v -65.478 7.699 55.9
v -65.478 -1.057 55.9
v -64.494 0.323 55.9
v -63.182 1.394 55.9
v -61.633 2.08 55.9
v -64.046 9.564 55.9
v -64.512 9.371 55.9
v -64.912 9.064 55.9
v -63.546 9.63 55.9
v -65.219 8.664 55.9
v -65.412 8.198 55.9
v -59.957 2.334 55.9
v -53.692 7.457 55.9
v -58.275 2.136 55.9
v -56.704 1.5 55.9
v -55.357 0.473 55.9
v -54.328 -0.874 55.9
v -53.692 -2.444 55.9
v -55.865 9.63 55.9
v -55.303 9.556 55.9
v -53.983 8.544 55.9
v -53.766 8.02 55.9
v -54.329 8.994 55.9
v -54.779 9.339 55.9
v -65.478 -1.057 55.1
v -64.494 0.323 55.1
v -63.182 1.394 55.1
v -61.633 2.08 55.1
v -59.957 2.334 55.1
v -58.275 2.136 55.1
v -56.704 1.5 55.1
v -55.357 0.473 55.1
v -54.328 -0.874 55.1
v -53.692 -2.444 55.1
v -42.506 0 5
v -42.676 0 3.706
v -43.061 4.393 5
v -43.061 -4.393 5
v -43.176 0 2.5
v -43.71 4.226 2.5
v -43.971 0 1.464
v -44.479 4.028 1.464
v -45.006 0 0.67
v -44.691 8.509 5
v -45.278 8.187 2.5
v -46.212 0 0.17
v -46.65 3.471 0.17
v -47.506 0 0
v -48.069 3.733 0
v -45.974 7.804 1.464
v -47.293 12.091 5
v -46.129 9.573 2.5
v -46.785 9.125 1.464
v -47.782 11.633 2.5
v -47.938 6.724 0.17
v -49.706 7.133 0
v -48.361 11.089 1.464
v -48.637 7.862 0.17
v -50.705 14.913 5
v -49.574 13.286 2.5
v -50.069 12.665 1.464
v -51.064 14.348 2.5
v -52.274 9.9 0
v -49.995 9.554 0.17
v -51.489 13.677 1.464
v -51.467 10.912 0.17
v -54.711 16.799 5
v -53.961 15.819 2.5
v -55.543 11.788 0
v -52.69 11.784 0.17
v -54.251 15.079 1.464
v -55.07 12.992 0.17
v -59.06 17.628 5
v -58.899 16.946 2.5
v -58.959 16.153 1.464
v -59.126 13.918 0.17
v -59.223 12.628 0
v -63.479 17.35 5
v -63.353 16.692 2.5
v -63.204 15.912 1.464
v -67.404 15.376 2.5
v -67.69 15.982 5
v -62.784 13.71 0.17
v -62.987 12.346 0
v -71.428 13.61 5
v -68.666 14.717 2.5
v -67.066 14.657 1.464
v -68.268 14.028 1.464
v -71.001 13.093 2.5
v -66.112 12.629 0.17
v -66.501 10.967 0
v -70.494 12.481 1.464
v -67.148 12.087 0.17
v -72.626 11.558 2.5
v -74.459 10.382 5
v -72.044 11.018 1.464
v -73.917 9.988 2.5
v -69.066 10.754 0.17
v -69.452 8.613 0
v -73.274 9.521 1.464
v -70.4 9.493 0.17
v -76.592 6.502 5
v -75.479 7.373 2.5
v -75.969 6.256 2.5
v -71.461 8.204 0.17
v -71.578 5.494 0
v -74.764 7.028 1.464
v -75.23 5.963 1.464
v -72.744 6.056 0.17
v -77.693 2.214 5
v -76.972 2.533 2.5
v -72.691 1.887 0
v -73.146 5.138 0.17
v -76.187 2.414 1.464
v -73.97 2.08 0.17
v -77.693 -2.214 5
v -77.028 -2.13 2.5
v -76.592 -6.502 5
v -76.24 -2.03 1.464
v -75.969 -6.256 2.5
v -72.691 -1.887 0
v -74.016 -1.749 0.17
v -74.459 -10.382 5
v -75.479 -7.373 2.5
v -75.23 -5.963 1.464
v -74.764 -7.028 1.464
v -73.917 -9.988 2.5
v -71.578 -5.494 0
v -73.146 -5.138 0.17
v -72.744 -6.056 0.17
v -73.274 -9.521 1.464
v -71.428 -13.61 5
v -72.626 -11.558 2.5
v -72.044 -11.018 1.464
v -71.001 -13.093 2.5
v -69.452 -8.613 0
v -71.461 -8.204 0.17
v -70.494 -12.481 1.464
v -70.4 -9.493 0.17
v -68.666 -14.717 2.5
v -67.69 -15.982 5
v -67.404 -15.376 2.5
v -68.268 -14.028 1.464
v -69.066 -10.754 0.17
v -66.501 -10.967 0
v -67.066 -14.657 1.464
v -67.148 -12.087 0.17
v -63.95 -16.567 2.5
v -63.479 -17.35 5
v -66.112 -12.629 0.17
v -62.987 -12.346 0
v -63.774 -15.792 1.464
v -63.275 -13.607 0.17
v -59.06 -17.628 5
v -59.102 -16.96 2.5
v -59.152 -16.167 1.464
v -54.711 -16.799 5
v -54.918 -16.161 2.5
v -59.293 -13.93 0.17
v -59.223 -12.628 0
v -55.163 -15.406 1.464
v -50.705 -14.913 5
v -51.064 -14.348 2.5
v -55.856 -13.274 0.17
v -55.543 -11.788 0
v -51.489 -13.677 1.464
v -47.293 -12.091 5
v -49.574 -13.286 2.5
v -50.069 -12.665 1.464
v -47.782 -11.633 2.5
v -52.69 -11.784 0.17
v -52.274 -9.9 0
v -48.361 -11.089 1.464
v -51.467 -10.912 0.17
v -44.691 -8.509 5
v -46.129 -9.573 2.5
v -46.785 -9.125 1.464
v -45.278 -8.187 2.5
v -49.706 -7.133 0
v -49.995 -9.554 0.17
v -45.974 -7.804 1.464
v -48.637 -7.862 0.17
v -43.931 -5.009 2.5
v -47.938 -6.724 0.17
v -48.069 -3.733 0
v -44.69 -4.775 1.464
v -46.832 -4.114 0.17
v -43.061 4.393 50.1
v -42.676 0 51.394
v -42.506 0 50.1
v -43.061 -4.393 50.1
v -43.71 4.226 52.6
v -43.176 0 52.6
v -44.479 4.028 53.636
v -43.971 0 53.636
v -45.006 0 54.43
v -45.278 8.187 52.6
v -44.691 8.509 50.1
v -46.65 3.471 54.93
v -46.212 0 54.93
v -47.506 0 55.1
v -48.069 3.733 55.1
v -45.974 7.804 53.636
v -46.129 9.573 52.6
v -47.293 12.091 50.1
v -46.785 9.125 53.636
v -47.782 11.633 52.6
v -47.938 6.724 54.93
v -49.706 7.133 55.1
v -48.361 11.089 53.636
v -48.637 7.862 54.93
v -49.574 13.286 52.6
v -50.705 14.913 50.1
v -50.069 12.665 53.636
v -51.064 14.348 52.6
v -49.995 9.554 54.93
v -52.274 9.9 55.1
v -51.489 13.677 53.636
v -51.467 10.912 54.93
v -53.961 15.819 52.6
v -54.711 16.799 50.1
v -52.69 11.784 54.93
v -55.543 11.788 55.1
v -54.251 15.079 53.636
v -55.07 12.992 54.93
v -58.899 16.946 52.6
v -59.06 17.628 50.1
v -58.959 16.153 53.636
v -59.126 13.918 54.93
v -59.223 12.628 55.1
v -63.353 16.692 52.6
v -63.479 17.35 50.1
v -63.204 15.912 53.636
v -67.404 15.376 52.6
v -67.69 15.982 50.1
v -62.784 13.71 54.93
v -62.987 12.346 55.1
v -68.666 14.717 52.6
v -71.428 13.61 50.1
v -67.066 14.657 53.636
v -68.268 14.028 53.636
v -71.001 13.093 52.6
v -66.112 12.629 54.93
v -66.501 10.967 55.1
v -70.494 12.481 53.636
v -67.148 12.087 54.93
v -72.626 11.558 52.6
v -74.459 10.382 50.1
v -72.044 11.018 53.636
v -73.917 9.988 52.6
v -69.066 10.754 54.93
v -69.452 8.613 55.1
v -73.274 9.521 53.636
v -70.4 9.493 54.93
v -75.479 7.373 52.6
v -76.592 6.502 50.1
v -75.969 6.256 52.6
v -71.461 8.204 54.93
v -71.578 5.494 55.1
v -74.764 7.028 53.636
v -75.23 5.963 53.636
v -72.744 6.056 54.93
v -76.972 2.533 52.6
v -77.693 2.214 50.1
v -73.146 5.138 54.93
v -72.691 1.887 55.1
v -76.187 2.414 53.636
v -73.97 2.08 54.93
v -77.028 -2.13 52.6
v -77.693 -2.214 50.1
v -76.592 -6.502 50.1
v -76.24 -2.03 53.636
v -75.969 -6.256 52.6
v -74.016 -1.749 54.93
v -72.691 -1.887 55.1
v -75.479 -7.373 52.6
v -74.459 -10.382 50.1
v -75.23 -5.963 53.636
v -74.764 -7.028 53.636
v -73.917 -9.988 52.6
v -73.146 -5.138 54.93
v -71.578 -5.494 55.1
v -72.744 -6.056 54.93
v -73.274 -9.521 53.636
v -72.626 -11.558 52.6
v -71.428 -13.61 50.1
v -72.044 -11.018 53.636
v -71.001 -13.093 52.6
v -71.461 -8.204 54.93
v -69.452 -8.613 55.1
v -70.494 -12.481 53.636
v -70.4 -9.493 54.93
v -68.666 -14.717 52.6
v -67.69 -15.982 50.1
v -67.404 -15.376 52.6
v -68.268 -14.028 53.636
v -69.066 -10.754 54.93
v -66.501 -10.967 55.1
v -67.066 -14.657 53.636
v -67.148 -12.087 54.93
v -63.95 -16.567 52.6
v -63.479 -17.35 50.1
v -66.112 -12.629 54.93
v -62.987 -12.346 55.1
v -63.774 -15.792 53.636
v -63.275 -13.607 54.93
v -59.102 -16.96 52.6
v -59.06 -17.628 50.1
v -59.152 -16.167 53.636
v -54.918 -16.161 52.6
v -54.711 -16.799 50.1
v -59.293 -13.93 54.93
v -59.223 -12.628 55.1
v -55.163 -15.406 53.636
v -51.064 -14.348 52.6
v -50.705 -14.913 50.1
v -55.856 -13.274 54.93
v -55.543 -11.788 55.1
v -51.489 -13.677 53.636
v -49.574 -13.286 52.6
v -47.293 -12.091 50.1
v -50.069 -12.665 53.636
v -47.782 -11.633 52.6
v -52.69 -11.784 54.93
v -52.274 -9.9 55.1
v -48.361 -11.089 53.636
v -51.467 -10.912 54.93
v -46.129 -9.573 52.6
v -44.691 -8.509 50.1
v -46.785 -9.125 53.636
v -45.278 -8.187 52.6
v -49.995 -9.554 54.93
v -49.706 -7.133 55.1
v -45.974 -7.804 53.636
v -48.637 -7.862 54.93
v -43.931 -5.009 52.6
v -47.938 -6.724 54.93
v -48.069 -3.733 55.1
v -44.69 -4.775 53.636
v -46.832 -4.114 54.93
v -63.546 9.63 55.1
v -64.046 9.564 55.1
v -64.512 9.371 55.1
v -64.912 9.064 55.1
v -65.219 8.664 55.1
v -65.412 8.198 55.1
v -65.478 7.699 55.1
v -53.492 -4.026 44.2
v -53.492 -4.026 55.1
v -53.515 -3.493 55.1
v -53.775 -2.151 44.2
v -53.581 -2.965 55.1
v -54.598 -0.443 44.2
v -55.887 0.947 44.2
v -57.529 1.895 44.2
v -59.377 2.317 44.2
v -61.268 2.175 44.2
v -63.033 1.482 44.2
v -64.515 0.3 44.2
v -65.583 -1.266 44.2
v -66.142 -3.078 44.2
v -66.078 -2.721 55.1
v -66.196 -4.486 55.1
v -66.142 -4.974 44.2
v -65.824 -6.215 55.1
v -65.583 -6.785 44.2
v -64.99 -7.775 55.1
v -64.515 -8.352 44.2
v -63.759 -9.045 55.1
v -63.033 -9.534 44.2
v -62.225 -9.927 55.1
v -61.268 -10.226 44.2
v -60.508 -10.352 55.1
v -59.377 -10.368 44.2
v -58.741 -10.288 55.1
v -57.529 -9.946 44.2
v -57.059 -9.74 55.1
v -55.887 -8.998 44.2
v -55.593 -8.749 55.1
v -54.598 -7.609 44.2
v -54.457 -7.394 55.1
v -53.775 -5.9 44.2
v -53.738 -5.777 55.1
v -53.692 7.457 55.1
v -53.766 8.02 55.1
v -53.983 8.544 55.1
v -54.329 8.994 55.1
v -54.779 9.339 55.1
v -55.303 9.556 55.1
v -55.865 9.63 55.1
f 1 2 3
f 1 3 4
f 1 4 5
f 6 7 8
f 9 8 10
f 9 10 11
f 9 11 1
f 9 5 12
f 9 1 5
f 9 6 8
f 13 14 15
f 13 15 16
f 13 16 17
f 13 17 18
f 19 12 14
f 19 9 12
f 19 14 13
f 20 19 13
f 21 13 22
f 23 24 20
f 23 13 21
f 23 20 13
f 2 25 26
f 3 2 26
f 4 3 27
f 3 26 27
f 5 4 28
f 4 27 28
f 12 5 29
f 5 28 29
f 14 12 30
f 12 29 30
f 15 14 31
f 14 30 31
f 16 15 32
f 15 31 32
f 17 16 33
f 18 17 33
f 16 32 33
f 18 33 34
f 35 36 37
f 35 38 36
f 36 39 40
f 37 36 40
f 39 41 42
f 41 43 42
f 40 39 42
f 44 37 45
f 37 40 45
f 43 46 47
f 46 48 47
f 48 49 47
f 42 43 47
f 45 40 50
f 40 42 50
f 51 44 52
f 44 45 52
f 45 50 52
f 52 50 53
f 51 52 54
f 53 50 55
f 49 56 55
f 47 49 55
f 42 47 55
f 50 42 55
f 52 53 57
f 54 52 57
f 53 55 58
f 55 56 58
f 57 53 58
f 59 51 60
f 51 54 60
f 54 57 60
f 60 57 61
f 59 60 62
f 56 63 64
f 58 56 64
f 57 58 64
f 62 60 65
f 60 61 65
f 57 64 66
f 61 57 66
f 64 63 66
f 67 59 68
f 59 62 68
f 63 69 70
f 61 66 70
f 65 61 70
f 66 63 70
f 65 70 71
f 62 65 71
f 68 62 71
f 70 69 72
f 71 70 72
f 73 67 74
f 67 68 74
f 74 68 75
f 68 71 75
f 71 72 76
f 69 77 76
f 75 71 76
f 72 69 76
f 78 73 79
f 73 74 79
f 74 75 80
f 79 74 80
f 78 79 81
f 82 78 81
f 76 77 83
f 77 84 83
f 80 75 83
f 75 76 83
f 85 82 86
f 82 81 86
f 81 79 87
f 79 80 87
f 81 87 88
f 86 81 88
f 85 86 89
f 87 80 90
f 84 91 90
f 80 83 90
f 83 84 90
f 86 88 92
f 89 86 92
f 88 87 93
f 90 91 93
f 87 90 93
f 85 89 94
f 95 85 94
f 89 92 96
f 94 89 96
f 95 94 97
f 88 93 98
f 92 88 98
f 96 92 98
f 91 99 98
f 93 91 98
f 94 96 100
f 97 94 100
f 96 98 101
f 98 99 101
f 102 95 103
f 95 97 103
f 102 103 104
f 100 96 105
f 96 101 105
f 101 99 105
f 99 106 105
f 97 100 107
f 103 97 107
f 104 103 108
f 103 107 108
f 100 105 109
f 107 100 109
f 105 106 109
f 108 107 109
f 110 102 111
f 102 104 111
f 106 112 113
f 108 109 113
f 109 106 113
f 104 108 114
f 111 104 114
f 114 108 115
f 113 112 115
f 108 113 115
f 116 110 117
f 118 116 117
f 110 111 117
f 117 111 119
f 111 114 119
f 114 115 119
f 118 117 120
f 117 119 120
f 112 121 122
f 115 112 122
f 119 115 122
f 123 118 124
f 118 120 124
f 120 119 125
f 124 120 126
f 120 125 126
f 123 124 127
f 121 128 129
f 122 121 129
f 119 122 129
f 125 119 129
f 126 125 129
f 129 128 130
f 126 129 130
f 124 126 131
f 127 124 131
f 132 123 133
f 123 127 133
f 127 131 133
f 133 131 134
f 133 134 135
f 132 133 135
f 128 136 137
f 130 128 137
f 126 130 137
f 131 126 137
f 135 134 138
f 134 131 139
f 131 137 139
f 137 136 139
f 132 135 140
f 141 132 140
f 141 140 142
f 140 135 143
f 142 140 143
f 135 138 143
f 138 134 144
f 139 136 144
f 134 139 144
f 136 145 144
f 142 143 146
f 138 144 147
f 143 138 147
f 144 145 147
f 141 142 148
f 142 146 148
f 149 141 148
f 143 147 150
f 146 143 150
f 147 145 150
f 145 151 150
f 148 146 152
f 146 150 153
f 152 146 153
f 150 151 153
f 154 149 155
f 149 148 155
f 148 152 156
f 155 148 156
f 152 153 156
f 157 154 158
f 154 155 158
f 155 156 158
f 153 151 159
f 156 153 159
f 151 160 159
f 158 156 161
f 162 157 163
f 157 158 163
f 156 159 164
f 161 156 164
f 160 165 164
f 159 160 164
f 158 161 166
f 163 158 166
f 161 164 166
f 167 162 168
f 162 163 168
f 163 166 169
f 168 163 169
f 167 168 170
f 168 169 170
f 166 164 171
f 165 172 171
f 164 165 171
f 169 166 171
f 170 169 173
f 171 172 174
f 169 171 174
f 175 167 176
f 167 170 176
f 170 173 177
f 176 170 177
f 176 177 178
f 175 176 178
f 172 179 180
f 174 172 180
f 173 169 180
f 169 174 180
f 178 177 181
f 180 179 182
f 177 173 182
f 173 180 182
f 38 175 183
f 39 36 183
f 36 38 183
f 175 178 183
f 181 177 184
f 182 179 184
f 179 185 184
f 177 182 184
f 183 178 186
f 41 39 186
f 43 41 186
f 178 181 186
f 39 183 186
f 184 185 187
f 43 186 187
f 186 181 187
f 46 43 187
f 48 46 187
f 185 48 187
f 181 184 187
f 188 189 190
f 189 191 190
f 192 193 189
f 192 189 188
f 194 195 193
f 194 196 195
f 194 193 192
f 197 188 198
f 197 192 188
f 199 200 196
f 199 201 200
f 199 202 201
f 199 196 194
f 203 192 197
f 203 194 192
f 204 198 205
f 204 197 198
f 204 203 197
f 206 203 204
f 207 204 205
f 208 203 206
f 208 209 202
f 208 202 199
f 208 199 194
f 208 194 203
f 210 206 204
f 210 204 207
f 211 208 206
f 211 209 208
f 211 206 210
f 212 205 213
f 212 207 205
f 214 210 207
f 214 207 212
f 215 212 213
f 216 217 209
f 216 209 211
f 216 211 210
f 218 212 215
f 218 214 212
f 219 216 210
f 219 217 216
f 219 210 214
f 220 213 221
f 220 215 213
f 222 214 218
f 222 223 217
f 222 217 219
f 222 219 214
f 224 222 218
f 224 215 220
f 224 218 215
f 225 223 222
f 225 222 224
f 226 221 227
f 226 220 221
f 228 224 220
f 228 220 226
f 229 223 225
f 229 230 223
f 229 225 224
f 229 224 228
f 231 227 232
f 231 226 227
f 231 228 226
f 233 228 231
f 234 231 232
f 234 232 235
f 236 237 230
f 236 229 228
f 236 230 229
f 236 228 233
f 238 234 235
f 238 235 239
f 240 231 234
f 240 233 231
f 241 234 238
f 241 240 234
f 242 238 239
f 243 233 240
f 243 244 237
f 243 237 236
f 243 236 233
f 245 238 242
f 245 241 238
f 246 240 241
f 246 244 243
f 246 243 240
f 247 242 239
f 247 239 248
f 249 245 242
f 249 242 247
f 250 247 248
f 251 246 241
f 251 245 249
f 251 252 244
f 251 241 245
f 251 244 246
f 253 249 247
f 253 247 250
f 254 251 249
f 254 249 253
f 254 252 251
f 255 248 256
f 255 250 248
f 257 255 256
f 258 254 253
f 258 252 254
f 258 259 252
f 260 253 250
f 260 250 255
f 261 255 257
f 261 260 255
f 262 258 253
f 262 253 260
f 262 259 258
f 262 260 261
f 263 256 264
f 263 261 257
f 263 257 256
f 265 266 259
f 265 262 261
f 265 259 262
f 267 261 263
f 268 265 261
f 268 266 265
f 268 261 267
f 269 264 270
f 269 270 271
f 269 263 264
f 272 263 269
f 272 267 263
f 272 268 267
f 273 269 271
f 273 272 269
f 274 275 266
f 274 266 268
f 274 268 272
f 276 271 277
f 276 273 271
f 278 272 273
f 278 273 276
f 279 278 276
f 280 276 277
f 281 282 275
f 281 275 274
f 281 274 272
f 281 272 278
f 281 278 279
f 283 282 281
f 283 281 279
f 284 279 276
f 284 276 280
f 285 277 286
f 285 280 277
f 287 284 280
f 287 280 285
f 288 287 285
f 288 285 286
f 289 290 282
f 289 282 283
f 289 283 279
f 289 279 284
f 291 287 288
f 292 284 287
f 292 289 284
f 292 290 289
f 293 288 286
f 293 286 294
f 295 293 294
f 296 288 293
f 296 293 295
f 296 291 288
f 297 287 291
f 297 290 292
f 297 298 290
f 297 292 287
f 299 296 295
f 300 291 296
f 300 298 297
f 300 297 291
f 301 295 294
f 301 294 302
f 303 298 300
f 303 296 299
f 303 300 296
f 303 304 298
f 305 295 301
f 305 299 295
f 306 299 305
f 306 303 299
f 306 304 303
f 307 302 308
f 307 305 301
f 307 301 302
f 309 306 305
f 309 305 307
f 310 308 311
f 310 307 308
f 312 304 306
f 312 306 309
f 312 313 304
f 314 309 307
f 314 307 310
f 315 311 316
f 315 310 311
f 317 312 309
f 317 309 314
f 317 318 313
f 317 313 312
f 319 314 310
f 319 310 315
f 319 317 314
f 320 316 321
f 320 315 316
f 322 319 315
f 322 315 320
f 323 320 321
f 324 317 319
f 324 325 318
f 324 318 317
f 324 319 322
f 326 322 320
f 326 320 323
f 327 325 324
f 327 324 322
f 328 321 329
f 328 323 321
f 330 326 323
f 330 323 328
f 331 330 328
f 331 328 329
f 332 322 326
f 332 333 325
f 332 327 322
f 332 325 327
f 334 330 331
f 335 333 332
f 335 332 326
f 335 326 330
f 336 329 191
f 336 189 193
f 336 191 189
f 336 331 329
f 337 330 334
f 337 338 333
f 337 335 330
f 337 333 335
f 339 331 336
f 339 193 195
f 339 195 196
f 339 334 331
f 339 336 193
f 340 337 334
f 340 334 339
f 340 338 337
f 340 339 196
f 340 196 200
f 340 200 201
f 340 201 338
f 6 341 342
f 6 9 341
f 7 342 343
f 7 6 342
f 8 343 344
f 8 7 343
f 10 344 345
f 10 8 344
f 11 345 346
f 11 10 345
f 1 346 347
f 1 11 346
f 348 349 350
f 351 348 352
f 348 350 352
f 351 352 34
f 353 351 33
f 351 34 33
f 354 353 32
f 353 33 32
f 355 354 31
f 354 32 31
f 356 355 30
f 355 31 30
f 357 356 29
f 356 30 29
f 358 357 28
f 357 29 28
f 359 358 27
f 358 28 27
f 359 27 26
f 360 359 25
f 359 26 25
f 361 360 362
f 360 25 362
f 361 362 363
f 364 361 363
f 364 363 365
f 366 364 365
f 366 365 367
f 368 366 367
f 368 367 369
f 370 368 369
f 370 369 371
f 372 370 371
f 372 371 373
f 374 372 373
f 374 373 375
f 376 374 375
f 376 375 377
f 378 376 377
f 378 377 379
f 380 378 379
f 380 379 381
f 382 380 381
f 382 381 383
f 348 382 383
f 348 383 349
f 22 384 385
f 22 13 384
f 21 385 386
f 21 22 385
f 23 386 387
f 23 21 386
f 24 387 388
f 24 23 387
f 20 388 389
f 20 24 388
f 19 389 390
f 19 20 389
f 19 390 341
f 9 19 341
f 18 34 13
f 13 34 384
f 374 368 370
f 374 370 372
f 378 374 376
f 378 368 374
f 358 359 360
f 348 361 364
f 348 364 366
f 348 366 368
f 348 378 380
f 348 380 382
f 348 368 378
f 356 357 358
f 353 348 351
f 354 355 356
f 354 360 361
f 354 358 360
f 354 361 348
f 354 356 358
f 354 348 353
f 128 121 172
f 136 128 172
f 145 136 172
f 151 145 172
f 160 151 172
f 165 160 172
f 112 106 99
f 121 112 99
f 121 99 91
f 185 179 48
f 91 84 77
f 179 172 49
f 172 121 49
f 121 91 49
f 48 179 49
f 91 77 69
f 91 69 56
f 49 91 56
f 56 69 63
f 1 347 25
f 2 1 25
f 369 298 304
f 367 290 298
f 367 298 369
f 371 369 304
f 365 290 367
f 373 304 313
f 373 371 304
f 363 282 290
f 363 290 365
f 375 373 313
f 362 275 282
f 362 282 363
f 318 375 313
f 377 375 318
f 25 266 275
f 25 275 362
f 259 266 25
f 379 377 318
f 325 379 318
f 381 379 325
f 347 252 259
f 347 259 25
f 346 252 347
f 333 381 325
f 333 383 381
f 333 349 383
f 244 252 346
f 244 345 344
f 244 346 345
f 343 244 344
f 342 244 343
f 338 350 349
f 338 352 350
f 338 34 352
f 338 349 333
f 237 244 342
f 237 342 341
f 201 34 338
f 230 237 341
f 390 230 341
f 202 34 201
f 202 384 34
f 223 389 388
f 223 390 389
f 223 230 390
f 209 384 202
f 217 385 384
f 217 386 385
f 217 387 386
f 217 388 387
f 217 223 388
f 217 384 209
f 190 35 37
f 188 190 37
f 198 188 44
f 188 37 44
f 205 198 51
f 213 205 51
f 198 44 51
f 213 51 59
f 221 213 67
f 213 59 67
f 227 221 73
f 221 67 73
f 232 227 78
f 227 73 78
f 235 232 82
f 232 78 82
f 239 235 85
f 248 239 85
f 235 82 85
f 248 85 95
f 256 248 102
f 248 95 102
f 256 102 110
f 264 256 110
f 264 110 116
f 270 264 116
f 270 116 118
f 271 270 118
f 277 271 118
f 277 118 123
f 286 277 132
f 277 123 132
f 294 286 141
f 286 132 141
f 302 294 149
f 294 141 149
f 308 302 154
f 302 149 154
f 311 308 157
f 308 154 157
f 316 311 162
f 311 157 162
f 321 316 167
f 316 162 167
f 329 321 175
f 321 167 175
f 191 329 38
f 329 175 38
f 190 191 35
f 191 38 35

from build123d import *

# Parameters (mm, degrees)
F0_R     = 17.6630626633
F1_DEPTH = 55.1
F2_R     = 5
F3_R     = 6.360255015
F4_DEPTH = 4.4
F5_DEPTH = 9.1
F6_DEPTH = 6.2
F8_DEPTH = 0.8
F9_R     = 2.1727922061
F10_R    = 1.9313708499


# Not quite as in the source:
# - the program builds the solid bodies; features that only make, move or delete a surface that nothing else refers to are left out


with BuildPart() as f1:
    # F0 (on Top) → F1 (new body)
    with BuildSketch(Plane.XY):
        with Locations((-60.169108212, 0)):
            Circle(F0_R)
    extrude(amount=F1_DEPTH)

    # F2
    f2_edges = [f1.edges().sort_by_distance(p)[0] for p in [
        (-77.832171, 0, 0),
        (-77.832171, 0, 55.1),
    ]]
    fillet(f2_edges, radius=F2_R)

    # F3 (on face) → F4 (join)
    with BuildSketch(Plane.XY.offset(55.1)):
        with Locations((-59.8526485264, -4.0257023647)):
            Circle(F3_R)
    extrude(amount=F4_DEPTH)

    # F5 (cut): a face of the model
    f5_faces = [f1.faces().sort_by_distance(p)[0] for p in [
        (-59.8526485264, -4.0257023647, 59.5),
    ]]
    extrude(f5_faces, amount=-F5_DEPTH, mode=Mode.SUBTRACT)

    # F6 (cut): a face of the model
    f6_faces = [f1.faces().sort_by_distance(p)[0] for p in [
        (-59.8526485264, -4.0257023647, 50.4),
    ]]
    extrude(f6_faces, amount=-F6_DEPTH, mode=Mode.SUBTRACT)

    # F7 (on face) → F8 (join)
    with BuildSketch(Plane.XY.offset(55.1)):
        with BuildLine():
            Line((-53.6922231234, 9.6299564466), (-65.4776543379, 9.6299564466))
            Line((-65.4776543379, 9.6299564466), (-65.4776543379, -1.0571752086))
            ThreePointArc((-65.4776543379, -1.0571752086), (-59.1093847847, 2.2909742033), (-53.6922231234, -2.4439303493))
            Line((-53.6922231234, -2.4439303493), (-53.6922231234, 9.6299564466))
        make_face()
    extrude(amount=F8_DEPTH)

    # F9
    f9_edges = [f1.edges().sort_by_distance(p)[0] for p in [
        (-53.692223, 9.629956, 55.5),
    ]]
    fillet(f9_edges, radius=F9_R)

    # F10
    f10_edges = [f1.edges().sort_by_distance(p)[0] for p in [
        (-65.477654, 9.629956, 55.5),
    ]]
    fillet(f10_edges, radius=F10_R)


solid = f1.part
